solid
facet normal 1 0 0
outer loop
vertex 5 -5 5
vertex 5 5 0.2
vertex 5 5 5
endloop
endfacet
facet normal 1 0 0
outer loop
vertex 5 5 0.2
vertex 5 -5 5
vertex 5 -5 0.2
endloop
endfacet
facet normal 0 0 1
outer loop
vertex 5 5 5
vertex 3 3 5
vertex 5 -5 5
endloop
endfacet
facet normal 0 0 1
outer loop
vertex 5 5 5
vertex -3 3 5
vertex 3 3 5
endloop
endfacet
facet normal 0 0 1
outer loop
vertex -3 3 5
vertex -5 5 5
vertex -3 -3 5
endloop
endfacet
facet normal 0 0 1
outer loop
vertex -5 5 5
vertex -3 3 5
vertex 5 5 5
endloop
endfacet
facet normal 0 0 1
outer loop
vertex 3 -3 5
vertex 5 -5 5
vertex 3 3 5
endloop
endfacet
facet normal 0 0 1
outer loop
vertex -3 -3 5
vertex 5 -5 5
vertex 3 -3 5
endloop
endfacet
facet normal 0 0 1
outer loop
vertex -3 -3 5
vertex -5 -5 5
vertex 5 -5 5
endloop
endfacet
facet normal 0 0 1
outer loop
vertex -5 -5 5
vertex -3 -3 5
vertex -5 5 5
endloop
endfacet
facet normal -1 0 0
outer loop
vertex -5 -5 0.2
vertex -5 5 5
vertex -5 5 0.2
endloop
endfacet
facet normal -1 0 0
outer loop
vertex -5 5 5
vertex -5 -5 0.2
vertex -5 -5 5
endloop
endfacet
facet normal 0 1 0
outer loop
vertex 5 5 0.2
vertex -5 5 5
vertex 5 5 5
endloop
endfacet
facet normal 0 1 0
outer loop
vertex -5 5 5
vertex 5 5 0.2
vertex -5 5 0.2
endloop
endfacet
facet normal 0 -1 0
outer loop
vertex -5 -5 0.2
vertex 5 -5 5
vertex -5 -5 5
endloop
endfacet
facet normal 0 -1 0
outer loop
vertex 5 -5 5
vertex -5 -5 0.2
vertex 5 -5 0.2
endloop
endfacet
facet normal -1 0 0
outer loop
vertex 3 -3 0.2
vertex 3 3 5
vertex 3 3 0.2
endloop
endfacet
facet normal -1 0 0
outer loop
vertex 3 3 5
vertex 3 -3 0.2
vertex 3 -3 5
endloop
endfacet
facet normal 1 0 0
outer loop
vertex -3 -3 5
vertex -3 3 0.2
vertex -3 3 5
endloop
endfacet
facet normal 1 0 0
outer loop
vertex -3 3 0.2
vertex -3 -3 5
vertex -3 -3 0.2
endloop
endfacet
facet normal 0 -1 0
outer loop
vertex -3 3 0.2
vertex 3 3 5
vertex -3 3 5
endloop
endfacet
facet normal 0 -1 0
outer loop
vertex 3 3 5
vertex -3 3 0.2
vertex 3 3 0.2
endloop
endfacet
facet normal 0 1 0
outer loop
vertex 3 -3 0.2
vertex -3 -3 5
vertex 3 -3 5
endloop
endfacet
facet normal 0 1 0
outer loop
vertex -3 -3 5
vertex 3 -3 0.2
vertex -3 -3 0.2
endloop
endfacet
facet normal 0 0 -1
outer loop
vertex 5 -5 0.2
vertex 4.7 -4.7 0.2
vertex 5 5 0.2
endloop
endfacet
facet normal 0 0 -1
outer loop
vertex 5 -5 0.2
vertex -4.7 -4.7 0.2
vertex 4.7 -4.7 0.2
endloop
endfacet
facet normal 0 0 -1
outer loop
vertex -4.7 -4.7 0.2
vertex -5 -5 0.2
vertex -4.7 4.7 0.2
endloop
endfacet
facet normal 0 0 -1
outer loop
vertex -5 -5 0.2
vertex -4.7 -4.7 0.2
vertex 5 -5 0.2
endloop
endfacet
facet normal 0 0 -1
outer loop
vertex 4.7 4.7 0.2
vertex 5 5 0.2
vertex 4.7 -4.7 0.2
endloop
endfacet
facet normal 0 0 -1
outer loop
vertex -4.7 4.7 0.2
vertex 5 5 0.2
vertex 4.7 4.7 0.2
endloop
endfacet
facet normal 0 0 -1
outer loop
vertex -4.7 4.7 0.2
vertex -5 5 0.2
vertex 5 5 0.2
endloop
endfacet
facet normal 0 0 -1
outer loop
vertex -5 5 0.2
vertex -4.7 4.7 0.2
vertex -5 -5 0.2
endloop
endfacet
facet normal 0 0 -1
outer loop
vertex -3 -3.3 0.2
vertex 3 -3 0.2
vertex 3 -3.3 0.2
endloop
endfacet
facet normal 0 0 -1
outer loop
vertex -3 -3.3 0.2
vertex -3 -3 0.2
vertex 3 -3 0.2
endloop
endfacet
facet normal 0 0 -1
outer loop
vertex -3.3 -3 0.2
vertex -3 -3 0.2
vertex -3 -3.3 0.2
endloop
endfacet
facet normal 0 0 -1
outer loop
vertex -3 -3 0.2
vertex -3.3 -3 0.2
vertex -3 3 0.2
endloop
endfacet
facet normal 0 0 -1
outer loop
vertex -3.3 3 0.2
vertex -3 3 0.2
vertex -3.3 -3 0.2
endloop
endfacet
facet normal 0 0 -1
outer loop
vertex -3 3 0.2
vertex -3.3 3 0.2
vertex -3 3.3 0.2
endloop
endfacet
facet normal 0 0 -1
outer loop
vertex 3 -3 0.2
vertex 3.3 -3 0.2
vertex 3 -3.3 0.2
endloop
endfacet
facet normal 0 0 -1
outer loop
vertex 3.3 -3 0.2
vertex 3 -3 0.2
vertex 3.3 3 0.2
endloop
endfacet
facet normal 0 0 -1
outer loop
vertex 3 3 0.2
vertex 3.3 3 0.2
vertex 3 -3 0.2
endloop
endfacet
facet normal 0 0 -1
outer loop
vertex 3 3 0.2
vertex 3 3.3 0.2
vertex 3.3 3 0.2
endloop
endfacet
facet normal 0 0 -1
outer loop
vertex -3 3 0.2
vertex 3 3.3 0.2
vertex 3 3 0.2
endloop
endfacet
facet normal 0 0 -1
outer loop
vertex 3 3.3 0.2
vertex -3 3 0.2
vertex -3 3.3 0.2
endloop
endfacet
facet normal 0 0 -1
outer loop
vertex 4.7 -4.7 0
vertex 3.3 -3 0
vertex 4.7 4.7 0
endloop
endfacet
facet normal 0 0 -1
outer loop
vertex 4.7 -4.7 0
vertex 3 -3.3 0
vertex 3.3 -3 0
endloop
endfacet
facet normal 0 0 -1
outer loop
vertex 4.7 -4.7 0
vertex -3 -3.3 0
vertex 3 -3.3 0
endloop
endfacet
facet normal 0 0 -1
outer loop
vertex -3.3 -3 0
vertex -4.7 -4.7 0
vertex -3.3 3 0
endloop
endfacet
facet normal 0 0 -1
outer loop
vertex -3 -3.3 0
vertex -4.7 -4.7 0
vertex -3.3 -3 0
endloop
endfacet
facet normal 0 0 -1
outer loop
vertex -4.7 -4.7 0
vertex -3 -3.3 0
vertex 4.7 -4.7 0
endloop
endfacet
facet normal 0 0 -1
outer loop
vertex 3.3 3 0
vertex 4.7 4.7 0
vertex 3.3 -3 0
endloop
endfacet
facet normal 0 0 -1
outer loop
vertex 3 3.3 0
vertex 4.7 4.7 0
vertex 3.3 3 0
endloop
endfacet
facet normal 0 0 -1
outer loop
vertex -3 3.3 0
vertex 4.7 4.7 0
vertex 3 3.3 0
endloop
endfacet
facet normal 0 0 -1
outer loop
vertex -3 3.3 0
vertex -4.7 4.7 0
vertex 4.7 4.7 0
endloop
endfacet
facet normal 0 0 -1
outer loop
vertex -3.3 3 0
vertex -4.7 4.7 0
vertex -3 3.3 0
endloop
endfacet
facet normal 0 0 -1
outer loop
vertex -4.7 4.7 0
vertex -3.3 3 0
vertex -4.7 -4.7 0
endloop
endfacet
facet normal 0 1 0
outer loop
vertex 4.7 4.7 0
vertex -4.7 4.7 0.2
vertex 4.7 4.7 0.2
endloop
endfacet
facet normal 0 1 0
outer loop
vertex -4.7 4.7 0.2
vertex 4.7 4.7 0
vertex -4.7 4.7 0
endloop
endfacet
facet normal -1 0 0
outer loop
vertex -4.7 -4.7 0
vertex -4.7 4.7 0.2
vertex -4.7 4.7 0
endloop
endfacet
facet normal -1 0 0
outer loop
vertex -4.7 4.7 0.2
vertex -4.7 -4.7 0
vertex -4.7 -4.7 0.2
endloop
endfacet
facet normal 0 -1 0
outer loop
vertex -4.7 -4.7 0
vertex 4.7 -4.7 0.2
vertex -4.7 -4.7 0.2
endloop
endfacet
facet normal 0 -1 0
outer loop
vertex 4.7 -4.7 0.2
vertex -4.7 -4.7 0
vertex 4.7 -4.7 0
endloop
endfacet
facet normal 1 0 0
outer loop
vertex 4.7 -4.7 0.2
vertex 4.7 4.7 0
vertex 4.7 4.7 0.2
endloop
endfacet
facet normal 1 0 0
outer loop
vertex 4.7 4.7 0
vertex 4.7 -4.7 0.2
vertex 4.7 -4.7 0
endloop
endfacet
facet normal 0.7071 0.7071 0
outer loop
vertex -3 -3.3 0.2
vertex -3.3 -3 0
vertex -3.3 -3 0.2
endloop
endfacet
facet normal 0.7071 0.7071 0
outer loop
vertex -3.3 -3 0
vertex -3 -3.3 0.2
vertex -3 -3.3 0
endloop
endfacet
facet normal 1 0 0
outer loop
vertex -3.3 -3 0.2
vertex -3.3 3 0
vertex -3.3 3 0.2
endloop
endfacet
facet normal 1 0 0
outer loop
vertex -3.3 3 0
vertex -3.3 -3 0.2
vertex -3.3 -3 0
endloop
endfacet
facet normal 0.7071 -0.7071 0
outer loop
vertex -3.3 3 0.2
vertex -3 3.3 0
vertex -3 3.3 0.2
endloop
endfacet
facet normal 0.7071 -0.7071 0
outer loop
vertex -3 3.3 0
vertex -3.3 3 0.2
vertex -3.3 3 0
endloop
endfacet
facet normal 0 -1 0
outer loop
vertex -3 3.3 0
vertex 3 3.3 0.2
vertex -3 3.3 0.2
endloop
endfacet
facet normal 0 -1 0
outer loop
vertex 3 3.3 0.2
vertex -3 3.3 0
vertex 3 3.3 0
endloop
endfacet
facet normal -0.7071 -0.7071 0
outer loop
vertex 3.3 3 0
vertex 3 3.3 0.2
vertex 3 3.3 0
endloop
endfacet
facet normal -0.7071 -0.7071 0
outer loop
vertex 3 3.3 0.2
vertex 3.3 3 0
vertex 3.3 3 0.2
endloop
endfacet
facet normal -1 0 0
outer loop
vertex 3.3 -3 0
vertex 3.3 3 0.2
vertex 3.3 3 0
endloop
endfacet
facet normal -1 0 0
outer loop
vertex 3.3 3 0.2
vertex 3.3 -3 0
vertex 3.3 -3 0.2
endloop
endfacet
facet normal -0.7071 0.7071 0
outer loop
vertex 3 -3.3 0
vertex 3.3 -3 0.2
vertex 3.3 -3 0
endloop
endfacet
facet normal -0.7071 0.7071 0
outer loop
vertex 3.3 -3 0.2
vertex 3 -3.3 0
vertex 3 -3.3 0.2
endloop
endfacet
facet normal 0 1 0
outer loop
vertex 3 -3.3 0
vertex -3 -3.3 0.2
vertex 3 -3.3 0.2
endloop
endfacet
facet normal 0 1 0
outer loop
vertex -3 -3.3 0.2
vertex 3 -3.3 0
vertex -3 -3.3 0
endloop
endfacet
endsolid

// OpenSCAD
eps = 0.01;
inset_width = 0.3;
inset_height = 0.2;

// An arbitrary part wich is placed at z=0.
module my_part() {
  difference() {
    translate([-5, -5, 0]) cube([10, 10, 5]);
    cube([6, 6, 20], center=true);
  }
}

// The arbitrary part with first layer inset.
module my_part_with_first_layer_inset() {
  difference() {
    my_part();  // <<====
    cube([100, 100, 2*inset_height], center=true);
  }
  linear_extrude(height=inset_height+eps) 
    offset(r = -inset_width) 
      projection(cut=true) 
        my_part();  // <<====
}

my_part_with_first_layer_inset();
